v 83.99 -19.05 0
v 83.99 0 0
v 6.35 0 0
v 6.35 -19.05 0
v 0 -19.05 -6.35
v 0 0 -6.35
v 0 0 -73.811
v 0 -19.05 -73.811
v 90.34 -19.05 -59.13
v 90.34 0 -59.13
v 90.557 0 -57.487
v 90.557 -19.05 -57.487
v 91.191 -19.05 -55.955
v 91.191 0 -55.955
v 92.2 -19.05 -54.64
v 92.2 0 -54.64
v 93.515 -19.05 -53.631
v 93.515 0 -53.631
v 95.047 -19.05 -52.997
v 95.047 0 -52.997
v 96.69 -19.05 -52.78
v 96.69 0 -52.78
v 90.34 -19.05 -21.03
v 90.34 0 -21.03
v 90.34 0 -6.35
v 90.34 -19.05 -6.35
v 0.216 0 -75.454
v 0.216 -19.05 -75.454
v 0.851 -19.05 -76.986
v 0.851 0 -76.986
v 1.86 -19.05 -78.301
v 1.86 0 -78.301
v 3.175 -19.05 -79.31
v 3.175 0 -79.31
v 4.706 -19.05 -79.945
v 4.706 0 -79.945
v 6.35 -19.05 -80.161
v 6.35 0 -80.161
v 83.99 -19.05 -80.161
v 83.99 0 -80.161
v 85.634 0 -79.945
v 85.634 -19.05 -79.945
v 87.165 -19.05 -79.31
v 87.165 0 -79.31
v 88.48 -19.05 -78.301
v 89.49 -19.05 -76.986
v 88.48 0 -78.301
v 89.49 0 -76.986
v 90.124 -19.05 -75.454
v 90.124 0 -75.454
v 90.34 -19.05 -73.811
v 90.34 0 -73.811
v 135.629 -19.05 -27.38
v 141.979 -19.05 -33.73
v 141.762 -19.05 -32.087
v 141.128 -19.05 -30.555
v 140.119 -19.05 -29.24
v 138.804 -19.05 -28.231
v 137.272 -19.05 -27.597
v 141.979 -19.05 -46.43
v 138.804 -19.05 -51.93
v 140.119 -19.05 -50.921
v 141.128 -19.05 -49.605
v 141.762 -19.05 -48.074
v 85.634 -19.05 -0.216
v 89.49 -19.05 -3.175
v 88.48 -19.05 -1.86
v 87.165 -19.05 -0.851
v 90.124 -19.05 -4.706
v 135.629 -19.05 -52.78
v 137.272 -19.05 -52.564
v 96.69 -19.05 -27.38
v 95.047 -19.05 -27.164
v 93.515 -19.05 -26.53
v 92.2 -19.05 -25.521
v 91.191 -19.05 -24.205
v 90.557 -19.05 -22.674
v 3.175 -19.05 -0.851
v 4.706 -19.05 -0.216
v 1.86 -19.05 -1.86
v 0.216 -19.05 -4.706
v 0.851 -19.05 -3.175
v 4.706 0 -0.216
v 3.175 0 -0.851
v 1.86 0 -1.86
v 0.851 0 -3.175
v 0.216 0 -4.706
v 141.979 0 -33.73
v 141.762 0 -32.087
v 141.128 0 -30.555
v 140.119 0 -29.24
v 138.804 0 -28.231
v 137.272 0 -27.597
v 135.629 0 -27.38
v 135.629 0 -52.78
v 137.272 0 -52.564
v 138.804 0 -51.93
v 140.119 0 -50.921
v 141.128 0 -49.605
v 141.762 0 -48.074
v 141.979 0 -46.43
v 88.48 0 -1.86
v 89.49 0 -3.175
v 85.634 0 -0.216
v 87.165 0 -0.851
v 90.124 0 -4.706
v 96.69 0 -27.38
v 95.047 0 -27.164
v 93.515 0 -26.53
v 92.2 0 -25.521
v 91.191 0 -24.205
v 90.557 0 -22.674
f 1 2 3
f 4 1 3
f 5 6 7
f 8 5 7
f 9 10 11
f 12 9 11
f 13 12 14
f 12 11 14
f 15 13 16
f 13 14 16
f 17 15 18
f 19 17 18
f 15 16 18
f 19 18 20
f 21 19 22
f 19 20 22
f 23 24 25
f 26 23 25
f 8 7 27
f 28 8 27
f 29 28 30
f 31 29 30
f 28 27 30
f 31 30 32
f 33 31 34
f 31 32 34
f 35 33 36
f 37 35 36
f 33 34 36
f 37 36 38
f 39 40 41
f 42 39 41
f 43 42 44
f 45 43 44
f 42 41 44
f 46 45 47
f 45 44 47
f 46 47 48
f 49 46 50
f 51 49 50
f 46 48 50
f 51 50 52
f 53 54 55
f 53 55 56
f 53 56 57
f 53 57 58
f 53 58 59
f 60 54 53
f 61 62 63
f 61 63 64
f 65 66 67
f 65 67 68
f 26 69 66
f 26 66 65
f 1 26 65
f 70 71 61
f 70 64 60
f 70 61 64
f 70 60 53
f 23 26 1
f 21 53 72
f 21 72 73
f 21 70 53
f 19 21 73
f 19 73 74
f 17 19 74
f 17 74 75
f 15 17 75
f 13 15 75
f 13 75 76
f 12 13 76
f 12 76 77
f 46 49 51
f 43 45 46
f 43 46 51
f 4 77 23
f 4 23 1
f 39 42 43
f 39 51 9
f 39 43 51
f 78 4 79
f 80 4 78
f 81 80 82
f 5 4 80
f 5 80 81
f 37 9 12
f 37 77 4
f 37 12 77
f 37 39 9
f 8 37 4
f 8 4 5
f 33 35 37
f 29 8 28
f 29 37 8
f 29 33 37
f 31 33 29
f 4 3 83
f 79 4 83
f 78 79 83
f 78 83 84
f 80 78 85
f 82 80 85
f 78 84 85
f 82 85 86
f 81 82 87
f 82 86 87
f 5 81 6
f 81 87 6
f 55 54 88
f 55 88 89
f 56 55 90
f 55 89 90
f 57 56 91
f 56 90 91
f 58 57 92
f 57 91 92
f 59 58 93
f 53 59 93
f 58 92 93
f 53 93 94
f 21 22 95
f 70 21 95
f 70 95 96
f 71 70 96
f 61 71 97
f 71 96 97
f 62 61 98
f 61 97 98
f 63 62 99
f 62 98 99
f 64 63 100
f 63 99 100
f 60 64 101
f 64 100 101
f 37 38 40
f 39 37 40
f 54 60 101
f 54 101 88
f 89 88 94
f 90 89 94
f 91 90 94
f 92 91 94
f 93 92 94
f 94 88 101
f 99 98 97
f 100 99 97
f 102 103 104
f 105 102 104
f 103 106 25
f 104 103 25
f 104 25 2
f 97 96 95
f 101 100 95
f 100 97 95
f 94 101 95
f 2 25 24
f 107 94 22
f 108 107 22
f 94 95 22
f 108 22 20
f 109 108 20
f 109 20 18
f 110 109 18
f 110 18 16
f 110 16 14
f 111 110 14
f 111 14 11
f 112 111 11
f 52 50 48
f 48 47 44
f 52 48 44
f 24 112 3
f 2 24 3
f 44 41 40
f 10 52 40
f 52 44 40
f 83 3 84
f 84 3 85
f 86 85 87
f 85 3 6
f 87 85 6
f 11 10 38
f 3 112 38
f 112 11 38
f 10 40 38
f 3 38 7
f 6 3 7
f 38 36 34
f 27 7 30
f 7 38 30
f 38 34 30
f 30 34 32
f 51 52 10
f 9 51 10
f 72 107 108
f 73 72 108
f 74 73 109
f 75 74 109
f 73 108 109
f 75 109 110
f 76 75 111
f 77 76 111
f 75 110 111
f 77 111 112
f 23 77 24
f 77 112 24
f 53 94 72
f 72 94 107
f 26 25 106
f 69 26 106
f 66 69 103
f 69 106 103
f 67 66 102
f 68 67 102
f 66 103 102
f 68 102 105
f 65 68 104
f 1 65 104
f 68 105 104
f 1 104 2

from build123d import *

# Parameters (mm, degrees)
EXTRUDE2_DEPTH = 19.05


with BuildPart() as part:
    # Sketch2 → Extrude2 (new body)
    with BuildSketch(Plane(origin=(0, 0, 0), x_dir=(1, 0, 0), z_dir=(0, 1, 0))):
        with BuildLine():
            Line((0, 6.35), (0, 73.810967782))
            ThreePointArc((0, 73.810967782), (1.859871939, 78.301095843), (6.35, 80.160967782))
            Line((6.35, 80.160967782), (83.990365758, 80.160967782))
            ThreePointArc((83.990365758, 80.160967782), (88.480493819, 78.301095843), (90.340365758, 73.810967782))
            Line((90.340365758, 73.810967782), (90.340365758, 59.130483891))
            ThreePointArc((90.340365758, 59.130483891), (92.200237698, 54.640355831), (96.690365758, 52.780483891))
            Line((96.690365758, 52.780483891), (135.628548363, 52.780483891))
            ThreePointArc((135.628548363, 52.780483891), (140.118676423, 50.920611952), (141.978548363, 46.430483891))
            Line((141.978548363, 46.430483891), (141.978548363, 33.730483891))
            ThreePointArc((141.978548363, 33.730483891), (140.118676423, 29.240355831), (135.628548363, 27.380483891))
            Line((135.628548363, 27.380483891), (96.690365758, 27.380483891))
            ThreePointArc((96.690365758, 27.380483891), (92.200237698, 25.520611952), (90.340365758, 21.030483891))
            Line((90.340365758, 21.030483891), (90.340365758, 6.35))
            ThreePointArc((90.340365758, 6.35), (88.480493819, 1.859871939), (83.990365758, 0))
            Line((83.990365758, 0), (6.35, 0))
            ThreePointArc((6.35, 0), (1.859871939, 1.859871939), (0, 6.35))
        make_face()
    extrude(amount=-EXTRUDE2_DEPTH)


solid = part.part
